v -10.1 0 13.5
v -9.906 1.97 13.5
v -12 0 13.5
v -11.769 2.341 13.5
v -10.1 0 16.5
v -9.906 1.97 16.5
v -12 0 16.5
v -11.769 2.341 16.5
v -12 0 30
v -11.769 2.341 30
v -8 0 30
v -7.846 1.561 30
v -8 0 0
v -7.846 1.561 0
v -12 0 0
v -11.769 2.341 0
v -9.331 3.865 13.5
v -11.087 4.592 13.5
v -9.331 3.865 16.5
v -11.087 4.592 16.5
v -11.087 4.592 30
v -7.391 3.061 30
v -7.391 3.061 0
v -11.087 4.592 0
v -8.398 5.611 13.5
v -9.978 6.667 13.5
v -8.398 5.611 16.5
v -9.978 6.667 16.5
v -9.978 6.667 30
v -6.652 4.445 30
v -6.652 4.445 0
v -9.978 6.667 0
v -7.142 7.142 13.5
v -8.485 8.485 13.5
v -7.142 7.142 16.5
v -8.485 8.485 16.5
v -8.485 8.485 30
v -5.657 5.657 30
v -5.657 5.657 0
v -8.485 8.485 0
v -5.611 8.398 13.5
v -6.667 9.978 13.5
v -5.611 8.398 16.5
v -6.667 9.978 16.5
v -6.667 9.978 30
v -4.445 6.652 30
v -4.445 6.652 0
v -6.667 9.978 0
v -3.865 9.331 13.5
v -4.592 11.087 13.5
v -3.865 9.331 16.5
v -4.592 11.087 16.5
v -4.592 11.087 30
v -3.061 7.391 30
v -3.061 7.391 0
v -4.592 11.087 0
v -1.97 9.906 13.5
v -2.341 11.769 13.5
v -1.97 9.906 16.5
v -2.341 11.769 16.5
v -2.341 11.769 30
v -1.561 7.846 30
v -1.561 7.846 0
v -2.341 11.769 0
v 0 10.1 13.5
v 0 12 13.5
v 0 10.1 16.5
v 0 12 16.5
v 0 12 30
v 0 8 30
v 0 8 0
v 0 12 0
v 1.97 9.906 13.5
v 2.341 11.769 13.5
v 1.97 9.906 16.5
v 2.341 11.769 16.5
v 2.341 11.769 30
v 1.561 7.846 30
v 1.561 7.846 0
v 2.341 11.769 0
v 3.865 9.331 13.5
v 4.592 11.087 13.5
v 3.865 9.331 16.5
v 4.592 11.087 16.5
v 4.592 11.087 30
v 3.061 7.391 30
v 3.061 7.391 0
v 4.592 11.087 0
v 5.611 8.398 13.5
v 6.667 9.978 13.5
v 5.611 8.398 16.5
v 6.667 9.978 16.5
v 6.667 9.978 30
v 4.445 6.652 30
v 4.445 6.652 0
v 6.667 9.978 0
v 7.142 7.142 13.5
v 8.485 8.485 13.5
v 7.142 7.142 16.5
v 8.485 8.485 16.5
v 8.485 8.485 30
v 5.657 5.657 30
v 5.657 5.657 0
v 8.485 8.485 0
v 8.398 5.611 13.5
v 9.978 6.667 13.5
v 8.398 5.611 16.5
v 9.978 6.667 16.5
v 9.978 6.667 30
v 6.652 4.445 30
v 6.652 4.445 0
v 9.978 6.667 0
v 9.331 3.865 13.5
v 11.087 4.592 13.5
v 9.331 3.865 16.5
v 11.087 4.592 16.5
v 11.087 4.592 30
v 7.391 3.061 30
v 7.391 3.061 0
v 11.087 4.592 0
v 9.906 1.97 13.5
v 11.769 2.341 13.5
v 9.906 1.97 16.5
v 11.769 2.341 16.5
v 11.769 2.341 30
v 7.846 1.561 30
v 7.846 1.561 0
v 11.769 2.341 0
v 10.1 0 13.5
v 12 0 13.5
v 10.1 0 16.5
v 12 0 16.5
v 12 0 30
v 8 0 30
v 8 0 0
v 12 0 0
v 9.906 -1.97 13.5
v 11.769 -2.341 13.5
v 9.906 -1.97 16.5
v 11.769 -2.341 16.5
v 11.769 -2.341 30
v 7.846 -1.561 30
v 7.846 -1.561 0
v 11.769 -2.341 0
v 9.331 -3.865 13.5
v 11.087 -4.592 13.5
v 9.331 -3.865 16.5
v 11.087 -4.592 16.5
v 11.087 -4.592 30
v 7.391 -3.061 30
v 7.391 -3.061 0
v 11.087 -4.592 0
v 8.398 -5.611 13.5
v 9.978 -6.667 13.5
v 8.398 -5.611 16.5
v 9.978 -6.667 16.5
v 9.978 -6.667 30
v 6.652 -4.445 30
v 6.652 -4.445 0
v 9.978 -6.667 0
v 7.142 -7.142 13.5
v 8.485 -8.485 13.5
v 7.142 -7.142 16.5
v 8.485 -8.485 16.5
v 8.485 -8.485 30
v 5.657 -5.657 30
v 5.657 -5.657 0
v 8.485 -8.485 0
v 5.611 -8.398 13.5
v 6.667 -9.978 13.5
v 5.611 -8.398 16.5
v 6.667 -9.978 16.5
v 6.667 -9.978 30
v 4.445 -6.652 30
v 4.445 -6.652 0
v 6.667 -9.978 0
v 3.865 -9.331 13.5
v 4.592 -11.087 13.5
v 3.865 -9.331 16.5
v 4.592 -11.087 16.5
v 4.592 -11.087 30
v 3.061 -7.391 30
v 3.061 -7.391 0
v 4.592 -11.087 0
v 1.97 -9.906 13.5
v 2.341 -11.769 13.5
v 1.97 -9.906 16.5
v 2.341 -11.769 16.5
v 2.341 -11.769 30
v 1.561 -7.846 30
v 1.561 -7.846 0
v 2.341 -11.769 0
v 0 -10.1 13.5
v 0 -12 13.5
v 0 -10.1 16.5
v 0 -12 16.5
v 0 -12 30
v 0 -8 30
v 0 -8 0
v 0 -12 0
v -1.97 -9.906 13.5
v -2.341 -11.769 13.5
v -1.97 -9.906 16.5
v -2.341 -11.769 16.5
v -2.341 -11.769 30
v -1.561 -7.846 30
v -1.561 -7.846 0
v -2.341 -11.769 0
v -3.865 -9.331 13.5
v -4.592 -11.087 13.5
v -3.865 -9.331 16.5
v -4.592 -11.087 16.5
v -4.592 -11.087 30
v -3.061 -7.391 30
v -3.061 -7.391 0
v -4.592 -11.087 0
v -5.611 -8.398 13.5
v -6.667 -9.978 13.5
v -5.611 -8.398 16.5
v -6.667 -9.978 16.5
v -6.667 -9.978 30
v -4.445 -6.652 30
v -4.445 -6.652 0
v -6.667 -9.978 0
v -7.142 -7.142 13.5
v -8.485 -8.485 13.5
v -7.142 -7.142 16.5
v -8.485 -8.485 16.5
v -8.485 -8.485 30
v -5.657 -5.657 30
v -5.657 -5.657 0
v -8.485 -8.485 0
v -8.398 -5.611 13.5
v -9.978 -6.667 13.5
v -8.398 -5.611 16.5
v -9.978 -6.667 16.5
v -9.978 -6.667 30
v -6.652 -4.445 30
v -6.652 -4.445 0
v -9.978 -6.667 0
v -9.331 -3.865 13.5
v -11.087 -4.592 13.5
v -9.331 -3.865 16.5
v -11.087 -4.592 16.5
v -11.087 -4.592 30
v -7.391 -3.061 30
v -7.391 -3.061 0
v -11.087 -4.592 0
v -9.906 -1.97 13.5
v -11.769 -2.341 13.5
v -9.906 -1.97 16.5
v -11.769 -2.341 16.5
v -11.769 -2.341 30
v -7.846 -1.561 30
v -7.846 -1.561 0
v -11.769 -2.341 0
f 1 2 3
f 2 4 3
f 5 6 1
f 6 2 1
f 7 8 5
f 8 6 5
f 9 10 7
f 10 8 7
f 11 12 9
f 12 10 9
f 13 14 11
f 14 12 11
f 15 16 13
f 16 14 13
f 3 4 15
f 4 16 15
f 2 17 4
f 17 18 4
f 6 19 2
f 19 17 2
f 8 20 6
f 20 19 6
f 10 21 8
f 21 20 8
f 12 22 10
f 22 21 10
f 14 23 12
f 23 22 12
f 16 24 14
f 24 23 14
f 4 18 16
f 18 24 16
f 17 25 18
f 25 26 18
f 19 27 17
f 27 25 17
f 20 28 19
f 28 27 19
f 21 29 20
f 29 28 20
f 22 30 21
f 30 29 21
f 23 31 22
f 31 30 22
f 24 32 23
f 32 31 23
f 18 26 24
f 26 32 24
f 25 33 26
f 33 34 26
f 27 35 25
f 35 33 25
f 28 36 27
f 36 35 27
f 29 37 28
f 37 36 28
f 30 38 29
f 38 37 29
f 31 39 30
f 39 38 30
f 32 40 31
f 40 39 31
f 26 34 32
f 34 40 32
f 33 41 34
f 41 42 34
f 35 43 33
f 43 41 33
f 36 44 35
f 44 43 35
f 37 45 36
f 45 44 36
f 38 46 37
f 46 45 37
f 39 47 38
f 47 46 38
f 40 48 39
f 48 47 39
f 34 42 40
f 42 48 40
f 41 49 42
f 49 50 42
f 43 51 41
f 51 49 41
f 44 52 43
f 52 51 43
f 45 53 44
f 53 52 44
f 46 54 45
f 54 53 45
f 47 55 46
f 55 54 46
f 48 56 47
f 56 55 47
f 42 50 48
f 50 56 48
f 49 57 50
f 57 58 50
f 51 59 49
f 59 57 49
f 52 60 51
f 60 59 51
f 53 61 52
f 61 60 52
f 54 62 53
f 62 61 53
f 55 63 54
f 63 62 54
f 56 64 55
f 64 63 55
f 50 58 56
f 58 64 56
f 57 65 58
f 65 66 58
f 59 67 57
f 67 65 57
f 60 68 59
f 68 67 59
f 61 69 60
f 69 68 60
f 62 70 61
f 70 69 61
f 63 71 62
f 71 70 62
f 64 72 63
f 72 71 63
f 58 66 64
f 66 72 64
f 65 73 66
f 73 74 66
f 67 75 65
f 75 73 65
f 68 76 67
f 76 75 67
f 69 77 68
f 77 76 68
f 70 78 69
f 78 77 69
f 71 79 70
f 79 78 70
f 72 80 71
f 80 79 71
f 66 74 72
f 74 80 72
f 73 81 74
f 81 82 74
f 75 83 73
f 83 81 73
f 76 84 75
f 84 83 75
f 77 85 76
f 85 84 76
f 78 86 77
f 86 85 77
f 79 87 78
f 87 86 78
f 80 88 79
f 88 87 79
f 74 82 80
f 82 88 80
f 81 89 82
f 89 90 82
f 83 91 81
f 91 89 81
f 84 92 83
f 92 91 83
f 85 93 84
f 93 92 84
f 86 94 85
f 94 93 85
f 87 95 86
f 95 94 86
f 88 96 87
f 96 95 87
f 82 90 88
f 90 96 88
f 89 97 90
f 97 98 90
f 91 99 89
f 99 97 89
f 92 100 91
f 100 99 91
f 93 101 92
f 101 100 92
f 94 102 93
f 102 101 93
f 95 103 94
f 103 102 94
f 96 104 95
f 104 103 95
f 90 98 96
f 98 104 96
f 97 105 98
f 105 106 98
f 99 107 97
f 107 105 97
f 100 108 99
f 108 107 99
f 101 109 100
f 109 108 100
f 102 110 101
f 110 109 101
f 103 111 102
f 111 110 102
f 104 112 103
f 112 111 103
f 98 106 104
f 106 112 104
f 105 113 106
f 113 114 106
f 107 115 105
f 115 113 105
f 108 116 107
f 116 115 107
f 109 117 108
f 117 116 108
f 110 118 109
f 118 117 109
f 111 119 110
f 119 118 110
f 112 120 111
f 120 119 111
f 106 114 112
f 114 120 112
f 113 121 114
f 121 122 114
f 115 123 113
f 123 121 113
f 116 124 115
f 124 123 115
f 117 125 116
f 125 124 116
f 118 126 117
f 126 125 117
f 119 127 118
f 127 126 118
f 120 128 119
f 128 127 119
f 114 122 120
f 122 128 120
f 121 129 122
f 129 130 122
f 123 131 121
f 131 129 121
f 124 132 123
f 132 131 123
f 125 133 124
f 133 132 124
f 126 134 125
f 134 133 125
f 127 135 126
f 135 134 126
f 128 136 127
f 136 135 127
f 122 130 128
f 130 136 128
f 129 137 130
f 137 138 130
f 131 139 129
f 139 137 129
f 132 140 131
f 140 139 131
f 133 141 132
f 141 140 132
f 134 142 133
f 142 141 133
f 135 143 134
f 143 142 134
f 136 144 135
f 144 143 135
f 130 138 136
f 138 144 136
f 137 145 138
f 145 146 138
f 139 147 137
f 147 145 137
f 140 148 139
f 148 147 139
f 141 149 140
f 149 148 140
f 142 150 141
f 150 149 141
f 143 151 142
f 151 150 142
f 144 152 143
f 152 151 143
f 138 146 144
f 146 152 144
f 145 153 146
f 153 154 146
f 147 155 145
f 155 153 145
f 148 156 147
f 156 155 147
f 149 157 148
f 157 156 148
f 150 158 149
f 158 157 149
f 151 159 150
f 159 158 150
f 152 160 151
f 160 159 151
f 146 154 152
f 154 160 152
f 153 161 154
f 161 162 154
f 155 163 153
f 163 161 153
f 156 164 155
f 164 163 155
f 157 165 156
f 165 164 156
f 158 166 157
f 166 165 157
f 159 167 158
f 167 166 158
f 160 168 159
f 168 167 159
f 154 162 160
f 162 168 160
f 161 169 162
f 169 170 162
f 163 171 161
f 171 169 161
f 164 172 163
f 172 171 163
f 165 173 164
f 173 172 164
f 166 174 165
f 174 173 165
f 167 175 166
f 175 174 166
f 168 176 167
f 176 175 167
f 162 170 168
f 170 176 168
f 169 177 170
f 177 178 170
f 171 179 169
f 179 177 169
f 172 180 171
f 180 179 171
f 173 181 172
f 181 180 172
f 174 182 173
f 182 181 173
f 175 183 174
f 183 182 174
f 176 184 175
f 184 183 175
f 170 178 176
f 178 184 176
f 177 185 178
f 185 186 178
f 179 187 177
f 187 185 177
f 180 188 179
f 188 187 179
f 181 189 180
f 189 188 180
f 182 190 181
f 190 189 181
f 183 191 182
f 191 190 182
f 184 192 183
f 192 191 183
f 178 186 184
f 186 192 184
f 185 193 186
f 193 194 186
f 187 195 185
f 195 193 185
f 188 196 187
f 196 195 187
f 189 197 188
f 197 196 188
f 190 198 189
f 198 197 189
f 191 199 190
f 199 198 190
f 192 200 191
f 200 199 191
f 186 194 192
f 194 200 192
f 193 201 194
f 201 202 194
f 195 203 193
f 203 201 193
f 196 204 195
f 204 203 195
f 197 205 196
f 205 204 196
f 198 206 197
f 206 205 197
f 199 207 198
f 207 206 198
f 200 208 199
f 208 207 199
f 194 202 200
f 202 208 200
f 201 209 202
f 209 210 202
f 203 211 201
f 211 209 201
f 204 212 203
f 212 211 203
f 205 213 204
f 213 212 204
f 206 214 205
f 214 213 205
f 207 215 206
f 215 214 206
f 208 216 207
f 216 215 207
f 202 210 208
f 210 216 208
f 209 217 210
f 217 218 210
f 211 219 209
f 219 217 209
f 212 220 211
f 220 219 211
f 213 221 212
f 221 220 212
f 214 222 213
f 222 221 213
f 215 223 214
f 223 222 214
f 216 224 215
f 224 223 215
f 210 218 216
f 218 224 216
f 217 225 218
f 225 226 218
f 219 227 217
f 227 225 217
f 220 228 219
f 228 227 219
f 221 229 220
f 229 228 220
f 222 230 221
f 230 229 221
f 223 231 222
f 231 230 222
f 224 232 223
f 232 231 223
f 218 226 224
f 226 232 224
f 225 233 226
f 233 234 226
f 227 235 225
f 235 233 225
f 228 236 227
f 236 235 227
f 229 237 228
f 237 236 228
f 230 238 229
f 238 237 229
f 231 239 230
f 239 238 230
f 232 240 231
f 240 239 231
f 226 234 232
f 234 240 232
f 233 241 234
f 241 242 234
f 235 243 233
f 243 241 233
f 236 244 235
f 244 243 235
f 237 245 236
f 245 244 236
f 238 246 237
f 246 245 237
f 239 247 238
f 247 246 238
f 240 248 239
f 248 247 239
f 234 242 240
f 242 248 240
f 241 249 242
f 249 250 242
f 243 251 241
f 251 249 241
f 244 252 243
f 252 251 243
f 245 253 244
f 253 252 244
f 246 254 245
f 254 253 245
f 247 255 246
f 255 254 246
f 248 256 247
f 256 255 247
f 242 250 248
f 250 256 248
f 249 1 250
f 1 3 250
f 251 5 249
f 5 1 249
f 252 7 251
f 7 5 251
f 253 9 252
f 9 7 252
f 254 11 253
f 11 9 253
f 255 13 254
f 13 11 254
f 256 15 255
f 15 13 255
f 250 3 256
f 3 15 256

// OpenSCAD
$fn = 32;

// ----------------------------------------------------------------------
// Grooved revolve: plain_grooves, bore R8
// ----------------------------------------------------------------------

// --- parameters (mm) ---
bore_r = 8;               // bore radius
outer_r = 12;             // outer radius of the body
total_h = 30;             // overall height, Z
wall = 4;                 // radial wall thickness
groove_w = 3;             // groove width
groove_d = 1.9;           // groove depth
grooves = 1;              // number of outer grooves
fit_tol = 0.05;           // declared fit tolerance (prompt contract)
free_tol = 0.2;           // declared free tolerance (prompt contract)

bbox_x = 2 * outer_r;  // full diameter
bore_d = 2 * bore_r;  // bore diameter
body_d = 2 * outer_r;  // body diameter
revolve_angle = 360;  // full turn around the Z axis

profile = [[8, 0], [12, 0], [12, 13.5], [10.1, 13.5], [10.1, 16.5], [12, 16.5], [12, 30], [8, 30]];  // primary outline, 8 points, counter clockwise

// --- the one profile operation ---
rotate_extrude(angle = revolve_angle) polygon(points = profile);
